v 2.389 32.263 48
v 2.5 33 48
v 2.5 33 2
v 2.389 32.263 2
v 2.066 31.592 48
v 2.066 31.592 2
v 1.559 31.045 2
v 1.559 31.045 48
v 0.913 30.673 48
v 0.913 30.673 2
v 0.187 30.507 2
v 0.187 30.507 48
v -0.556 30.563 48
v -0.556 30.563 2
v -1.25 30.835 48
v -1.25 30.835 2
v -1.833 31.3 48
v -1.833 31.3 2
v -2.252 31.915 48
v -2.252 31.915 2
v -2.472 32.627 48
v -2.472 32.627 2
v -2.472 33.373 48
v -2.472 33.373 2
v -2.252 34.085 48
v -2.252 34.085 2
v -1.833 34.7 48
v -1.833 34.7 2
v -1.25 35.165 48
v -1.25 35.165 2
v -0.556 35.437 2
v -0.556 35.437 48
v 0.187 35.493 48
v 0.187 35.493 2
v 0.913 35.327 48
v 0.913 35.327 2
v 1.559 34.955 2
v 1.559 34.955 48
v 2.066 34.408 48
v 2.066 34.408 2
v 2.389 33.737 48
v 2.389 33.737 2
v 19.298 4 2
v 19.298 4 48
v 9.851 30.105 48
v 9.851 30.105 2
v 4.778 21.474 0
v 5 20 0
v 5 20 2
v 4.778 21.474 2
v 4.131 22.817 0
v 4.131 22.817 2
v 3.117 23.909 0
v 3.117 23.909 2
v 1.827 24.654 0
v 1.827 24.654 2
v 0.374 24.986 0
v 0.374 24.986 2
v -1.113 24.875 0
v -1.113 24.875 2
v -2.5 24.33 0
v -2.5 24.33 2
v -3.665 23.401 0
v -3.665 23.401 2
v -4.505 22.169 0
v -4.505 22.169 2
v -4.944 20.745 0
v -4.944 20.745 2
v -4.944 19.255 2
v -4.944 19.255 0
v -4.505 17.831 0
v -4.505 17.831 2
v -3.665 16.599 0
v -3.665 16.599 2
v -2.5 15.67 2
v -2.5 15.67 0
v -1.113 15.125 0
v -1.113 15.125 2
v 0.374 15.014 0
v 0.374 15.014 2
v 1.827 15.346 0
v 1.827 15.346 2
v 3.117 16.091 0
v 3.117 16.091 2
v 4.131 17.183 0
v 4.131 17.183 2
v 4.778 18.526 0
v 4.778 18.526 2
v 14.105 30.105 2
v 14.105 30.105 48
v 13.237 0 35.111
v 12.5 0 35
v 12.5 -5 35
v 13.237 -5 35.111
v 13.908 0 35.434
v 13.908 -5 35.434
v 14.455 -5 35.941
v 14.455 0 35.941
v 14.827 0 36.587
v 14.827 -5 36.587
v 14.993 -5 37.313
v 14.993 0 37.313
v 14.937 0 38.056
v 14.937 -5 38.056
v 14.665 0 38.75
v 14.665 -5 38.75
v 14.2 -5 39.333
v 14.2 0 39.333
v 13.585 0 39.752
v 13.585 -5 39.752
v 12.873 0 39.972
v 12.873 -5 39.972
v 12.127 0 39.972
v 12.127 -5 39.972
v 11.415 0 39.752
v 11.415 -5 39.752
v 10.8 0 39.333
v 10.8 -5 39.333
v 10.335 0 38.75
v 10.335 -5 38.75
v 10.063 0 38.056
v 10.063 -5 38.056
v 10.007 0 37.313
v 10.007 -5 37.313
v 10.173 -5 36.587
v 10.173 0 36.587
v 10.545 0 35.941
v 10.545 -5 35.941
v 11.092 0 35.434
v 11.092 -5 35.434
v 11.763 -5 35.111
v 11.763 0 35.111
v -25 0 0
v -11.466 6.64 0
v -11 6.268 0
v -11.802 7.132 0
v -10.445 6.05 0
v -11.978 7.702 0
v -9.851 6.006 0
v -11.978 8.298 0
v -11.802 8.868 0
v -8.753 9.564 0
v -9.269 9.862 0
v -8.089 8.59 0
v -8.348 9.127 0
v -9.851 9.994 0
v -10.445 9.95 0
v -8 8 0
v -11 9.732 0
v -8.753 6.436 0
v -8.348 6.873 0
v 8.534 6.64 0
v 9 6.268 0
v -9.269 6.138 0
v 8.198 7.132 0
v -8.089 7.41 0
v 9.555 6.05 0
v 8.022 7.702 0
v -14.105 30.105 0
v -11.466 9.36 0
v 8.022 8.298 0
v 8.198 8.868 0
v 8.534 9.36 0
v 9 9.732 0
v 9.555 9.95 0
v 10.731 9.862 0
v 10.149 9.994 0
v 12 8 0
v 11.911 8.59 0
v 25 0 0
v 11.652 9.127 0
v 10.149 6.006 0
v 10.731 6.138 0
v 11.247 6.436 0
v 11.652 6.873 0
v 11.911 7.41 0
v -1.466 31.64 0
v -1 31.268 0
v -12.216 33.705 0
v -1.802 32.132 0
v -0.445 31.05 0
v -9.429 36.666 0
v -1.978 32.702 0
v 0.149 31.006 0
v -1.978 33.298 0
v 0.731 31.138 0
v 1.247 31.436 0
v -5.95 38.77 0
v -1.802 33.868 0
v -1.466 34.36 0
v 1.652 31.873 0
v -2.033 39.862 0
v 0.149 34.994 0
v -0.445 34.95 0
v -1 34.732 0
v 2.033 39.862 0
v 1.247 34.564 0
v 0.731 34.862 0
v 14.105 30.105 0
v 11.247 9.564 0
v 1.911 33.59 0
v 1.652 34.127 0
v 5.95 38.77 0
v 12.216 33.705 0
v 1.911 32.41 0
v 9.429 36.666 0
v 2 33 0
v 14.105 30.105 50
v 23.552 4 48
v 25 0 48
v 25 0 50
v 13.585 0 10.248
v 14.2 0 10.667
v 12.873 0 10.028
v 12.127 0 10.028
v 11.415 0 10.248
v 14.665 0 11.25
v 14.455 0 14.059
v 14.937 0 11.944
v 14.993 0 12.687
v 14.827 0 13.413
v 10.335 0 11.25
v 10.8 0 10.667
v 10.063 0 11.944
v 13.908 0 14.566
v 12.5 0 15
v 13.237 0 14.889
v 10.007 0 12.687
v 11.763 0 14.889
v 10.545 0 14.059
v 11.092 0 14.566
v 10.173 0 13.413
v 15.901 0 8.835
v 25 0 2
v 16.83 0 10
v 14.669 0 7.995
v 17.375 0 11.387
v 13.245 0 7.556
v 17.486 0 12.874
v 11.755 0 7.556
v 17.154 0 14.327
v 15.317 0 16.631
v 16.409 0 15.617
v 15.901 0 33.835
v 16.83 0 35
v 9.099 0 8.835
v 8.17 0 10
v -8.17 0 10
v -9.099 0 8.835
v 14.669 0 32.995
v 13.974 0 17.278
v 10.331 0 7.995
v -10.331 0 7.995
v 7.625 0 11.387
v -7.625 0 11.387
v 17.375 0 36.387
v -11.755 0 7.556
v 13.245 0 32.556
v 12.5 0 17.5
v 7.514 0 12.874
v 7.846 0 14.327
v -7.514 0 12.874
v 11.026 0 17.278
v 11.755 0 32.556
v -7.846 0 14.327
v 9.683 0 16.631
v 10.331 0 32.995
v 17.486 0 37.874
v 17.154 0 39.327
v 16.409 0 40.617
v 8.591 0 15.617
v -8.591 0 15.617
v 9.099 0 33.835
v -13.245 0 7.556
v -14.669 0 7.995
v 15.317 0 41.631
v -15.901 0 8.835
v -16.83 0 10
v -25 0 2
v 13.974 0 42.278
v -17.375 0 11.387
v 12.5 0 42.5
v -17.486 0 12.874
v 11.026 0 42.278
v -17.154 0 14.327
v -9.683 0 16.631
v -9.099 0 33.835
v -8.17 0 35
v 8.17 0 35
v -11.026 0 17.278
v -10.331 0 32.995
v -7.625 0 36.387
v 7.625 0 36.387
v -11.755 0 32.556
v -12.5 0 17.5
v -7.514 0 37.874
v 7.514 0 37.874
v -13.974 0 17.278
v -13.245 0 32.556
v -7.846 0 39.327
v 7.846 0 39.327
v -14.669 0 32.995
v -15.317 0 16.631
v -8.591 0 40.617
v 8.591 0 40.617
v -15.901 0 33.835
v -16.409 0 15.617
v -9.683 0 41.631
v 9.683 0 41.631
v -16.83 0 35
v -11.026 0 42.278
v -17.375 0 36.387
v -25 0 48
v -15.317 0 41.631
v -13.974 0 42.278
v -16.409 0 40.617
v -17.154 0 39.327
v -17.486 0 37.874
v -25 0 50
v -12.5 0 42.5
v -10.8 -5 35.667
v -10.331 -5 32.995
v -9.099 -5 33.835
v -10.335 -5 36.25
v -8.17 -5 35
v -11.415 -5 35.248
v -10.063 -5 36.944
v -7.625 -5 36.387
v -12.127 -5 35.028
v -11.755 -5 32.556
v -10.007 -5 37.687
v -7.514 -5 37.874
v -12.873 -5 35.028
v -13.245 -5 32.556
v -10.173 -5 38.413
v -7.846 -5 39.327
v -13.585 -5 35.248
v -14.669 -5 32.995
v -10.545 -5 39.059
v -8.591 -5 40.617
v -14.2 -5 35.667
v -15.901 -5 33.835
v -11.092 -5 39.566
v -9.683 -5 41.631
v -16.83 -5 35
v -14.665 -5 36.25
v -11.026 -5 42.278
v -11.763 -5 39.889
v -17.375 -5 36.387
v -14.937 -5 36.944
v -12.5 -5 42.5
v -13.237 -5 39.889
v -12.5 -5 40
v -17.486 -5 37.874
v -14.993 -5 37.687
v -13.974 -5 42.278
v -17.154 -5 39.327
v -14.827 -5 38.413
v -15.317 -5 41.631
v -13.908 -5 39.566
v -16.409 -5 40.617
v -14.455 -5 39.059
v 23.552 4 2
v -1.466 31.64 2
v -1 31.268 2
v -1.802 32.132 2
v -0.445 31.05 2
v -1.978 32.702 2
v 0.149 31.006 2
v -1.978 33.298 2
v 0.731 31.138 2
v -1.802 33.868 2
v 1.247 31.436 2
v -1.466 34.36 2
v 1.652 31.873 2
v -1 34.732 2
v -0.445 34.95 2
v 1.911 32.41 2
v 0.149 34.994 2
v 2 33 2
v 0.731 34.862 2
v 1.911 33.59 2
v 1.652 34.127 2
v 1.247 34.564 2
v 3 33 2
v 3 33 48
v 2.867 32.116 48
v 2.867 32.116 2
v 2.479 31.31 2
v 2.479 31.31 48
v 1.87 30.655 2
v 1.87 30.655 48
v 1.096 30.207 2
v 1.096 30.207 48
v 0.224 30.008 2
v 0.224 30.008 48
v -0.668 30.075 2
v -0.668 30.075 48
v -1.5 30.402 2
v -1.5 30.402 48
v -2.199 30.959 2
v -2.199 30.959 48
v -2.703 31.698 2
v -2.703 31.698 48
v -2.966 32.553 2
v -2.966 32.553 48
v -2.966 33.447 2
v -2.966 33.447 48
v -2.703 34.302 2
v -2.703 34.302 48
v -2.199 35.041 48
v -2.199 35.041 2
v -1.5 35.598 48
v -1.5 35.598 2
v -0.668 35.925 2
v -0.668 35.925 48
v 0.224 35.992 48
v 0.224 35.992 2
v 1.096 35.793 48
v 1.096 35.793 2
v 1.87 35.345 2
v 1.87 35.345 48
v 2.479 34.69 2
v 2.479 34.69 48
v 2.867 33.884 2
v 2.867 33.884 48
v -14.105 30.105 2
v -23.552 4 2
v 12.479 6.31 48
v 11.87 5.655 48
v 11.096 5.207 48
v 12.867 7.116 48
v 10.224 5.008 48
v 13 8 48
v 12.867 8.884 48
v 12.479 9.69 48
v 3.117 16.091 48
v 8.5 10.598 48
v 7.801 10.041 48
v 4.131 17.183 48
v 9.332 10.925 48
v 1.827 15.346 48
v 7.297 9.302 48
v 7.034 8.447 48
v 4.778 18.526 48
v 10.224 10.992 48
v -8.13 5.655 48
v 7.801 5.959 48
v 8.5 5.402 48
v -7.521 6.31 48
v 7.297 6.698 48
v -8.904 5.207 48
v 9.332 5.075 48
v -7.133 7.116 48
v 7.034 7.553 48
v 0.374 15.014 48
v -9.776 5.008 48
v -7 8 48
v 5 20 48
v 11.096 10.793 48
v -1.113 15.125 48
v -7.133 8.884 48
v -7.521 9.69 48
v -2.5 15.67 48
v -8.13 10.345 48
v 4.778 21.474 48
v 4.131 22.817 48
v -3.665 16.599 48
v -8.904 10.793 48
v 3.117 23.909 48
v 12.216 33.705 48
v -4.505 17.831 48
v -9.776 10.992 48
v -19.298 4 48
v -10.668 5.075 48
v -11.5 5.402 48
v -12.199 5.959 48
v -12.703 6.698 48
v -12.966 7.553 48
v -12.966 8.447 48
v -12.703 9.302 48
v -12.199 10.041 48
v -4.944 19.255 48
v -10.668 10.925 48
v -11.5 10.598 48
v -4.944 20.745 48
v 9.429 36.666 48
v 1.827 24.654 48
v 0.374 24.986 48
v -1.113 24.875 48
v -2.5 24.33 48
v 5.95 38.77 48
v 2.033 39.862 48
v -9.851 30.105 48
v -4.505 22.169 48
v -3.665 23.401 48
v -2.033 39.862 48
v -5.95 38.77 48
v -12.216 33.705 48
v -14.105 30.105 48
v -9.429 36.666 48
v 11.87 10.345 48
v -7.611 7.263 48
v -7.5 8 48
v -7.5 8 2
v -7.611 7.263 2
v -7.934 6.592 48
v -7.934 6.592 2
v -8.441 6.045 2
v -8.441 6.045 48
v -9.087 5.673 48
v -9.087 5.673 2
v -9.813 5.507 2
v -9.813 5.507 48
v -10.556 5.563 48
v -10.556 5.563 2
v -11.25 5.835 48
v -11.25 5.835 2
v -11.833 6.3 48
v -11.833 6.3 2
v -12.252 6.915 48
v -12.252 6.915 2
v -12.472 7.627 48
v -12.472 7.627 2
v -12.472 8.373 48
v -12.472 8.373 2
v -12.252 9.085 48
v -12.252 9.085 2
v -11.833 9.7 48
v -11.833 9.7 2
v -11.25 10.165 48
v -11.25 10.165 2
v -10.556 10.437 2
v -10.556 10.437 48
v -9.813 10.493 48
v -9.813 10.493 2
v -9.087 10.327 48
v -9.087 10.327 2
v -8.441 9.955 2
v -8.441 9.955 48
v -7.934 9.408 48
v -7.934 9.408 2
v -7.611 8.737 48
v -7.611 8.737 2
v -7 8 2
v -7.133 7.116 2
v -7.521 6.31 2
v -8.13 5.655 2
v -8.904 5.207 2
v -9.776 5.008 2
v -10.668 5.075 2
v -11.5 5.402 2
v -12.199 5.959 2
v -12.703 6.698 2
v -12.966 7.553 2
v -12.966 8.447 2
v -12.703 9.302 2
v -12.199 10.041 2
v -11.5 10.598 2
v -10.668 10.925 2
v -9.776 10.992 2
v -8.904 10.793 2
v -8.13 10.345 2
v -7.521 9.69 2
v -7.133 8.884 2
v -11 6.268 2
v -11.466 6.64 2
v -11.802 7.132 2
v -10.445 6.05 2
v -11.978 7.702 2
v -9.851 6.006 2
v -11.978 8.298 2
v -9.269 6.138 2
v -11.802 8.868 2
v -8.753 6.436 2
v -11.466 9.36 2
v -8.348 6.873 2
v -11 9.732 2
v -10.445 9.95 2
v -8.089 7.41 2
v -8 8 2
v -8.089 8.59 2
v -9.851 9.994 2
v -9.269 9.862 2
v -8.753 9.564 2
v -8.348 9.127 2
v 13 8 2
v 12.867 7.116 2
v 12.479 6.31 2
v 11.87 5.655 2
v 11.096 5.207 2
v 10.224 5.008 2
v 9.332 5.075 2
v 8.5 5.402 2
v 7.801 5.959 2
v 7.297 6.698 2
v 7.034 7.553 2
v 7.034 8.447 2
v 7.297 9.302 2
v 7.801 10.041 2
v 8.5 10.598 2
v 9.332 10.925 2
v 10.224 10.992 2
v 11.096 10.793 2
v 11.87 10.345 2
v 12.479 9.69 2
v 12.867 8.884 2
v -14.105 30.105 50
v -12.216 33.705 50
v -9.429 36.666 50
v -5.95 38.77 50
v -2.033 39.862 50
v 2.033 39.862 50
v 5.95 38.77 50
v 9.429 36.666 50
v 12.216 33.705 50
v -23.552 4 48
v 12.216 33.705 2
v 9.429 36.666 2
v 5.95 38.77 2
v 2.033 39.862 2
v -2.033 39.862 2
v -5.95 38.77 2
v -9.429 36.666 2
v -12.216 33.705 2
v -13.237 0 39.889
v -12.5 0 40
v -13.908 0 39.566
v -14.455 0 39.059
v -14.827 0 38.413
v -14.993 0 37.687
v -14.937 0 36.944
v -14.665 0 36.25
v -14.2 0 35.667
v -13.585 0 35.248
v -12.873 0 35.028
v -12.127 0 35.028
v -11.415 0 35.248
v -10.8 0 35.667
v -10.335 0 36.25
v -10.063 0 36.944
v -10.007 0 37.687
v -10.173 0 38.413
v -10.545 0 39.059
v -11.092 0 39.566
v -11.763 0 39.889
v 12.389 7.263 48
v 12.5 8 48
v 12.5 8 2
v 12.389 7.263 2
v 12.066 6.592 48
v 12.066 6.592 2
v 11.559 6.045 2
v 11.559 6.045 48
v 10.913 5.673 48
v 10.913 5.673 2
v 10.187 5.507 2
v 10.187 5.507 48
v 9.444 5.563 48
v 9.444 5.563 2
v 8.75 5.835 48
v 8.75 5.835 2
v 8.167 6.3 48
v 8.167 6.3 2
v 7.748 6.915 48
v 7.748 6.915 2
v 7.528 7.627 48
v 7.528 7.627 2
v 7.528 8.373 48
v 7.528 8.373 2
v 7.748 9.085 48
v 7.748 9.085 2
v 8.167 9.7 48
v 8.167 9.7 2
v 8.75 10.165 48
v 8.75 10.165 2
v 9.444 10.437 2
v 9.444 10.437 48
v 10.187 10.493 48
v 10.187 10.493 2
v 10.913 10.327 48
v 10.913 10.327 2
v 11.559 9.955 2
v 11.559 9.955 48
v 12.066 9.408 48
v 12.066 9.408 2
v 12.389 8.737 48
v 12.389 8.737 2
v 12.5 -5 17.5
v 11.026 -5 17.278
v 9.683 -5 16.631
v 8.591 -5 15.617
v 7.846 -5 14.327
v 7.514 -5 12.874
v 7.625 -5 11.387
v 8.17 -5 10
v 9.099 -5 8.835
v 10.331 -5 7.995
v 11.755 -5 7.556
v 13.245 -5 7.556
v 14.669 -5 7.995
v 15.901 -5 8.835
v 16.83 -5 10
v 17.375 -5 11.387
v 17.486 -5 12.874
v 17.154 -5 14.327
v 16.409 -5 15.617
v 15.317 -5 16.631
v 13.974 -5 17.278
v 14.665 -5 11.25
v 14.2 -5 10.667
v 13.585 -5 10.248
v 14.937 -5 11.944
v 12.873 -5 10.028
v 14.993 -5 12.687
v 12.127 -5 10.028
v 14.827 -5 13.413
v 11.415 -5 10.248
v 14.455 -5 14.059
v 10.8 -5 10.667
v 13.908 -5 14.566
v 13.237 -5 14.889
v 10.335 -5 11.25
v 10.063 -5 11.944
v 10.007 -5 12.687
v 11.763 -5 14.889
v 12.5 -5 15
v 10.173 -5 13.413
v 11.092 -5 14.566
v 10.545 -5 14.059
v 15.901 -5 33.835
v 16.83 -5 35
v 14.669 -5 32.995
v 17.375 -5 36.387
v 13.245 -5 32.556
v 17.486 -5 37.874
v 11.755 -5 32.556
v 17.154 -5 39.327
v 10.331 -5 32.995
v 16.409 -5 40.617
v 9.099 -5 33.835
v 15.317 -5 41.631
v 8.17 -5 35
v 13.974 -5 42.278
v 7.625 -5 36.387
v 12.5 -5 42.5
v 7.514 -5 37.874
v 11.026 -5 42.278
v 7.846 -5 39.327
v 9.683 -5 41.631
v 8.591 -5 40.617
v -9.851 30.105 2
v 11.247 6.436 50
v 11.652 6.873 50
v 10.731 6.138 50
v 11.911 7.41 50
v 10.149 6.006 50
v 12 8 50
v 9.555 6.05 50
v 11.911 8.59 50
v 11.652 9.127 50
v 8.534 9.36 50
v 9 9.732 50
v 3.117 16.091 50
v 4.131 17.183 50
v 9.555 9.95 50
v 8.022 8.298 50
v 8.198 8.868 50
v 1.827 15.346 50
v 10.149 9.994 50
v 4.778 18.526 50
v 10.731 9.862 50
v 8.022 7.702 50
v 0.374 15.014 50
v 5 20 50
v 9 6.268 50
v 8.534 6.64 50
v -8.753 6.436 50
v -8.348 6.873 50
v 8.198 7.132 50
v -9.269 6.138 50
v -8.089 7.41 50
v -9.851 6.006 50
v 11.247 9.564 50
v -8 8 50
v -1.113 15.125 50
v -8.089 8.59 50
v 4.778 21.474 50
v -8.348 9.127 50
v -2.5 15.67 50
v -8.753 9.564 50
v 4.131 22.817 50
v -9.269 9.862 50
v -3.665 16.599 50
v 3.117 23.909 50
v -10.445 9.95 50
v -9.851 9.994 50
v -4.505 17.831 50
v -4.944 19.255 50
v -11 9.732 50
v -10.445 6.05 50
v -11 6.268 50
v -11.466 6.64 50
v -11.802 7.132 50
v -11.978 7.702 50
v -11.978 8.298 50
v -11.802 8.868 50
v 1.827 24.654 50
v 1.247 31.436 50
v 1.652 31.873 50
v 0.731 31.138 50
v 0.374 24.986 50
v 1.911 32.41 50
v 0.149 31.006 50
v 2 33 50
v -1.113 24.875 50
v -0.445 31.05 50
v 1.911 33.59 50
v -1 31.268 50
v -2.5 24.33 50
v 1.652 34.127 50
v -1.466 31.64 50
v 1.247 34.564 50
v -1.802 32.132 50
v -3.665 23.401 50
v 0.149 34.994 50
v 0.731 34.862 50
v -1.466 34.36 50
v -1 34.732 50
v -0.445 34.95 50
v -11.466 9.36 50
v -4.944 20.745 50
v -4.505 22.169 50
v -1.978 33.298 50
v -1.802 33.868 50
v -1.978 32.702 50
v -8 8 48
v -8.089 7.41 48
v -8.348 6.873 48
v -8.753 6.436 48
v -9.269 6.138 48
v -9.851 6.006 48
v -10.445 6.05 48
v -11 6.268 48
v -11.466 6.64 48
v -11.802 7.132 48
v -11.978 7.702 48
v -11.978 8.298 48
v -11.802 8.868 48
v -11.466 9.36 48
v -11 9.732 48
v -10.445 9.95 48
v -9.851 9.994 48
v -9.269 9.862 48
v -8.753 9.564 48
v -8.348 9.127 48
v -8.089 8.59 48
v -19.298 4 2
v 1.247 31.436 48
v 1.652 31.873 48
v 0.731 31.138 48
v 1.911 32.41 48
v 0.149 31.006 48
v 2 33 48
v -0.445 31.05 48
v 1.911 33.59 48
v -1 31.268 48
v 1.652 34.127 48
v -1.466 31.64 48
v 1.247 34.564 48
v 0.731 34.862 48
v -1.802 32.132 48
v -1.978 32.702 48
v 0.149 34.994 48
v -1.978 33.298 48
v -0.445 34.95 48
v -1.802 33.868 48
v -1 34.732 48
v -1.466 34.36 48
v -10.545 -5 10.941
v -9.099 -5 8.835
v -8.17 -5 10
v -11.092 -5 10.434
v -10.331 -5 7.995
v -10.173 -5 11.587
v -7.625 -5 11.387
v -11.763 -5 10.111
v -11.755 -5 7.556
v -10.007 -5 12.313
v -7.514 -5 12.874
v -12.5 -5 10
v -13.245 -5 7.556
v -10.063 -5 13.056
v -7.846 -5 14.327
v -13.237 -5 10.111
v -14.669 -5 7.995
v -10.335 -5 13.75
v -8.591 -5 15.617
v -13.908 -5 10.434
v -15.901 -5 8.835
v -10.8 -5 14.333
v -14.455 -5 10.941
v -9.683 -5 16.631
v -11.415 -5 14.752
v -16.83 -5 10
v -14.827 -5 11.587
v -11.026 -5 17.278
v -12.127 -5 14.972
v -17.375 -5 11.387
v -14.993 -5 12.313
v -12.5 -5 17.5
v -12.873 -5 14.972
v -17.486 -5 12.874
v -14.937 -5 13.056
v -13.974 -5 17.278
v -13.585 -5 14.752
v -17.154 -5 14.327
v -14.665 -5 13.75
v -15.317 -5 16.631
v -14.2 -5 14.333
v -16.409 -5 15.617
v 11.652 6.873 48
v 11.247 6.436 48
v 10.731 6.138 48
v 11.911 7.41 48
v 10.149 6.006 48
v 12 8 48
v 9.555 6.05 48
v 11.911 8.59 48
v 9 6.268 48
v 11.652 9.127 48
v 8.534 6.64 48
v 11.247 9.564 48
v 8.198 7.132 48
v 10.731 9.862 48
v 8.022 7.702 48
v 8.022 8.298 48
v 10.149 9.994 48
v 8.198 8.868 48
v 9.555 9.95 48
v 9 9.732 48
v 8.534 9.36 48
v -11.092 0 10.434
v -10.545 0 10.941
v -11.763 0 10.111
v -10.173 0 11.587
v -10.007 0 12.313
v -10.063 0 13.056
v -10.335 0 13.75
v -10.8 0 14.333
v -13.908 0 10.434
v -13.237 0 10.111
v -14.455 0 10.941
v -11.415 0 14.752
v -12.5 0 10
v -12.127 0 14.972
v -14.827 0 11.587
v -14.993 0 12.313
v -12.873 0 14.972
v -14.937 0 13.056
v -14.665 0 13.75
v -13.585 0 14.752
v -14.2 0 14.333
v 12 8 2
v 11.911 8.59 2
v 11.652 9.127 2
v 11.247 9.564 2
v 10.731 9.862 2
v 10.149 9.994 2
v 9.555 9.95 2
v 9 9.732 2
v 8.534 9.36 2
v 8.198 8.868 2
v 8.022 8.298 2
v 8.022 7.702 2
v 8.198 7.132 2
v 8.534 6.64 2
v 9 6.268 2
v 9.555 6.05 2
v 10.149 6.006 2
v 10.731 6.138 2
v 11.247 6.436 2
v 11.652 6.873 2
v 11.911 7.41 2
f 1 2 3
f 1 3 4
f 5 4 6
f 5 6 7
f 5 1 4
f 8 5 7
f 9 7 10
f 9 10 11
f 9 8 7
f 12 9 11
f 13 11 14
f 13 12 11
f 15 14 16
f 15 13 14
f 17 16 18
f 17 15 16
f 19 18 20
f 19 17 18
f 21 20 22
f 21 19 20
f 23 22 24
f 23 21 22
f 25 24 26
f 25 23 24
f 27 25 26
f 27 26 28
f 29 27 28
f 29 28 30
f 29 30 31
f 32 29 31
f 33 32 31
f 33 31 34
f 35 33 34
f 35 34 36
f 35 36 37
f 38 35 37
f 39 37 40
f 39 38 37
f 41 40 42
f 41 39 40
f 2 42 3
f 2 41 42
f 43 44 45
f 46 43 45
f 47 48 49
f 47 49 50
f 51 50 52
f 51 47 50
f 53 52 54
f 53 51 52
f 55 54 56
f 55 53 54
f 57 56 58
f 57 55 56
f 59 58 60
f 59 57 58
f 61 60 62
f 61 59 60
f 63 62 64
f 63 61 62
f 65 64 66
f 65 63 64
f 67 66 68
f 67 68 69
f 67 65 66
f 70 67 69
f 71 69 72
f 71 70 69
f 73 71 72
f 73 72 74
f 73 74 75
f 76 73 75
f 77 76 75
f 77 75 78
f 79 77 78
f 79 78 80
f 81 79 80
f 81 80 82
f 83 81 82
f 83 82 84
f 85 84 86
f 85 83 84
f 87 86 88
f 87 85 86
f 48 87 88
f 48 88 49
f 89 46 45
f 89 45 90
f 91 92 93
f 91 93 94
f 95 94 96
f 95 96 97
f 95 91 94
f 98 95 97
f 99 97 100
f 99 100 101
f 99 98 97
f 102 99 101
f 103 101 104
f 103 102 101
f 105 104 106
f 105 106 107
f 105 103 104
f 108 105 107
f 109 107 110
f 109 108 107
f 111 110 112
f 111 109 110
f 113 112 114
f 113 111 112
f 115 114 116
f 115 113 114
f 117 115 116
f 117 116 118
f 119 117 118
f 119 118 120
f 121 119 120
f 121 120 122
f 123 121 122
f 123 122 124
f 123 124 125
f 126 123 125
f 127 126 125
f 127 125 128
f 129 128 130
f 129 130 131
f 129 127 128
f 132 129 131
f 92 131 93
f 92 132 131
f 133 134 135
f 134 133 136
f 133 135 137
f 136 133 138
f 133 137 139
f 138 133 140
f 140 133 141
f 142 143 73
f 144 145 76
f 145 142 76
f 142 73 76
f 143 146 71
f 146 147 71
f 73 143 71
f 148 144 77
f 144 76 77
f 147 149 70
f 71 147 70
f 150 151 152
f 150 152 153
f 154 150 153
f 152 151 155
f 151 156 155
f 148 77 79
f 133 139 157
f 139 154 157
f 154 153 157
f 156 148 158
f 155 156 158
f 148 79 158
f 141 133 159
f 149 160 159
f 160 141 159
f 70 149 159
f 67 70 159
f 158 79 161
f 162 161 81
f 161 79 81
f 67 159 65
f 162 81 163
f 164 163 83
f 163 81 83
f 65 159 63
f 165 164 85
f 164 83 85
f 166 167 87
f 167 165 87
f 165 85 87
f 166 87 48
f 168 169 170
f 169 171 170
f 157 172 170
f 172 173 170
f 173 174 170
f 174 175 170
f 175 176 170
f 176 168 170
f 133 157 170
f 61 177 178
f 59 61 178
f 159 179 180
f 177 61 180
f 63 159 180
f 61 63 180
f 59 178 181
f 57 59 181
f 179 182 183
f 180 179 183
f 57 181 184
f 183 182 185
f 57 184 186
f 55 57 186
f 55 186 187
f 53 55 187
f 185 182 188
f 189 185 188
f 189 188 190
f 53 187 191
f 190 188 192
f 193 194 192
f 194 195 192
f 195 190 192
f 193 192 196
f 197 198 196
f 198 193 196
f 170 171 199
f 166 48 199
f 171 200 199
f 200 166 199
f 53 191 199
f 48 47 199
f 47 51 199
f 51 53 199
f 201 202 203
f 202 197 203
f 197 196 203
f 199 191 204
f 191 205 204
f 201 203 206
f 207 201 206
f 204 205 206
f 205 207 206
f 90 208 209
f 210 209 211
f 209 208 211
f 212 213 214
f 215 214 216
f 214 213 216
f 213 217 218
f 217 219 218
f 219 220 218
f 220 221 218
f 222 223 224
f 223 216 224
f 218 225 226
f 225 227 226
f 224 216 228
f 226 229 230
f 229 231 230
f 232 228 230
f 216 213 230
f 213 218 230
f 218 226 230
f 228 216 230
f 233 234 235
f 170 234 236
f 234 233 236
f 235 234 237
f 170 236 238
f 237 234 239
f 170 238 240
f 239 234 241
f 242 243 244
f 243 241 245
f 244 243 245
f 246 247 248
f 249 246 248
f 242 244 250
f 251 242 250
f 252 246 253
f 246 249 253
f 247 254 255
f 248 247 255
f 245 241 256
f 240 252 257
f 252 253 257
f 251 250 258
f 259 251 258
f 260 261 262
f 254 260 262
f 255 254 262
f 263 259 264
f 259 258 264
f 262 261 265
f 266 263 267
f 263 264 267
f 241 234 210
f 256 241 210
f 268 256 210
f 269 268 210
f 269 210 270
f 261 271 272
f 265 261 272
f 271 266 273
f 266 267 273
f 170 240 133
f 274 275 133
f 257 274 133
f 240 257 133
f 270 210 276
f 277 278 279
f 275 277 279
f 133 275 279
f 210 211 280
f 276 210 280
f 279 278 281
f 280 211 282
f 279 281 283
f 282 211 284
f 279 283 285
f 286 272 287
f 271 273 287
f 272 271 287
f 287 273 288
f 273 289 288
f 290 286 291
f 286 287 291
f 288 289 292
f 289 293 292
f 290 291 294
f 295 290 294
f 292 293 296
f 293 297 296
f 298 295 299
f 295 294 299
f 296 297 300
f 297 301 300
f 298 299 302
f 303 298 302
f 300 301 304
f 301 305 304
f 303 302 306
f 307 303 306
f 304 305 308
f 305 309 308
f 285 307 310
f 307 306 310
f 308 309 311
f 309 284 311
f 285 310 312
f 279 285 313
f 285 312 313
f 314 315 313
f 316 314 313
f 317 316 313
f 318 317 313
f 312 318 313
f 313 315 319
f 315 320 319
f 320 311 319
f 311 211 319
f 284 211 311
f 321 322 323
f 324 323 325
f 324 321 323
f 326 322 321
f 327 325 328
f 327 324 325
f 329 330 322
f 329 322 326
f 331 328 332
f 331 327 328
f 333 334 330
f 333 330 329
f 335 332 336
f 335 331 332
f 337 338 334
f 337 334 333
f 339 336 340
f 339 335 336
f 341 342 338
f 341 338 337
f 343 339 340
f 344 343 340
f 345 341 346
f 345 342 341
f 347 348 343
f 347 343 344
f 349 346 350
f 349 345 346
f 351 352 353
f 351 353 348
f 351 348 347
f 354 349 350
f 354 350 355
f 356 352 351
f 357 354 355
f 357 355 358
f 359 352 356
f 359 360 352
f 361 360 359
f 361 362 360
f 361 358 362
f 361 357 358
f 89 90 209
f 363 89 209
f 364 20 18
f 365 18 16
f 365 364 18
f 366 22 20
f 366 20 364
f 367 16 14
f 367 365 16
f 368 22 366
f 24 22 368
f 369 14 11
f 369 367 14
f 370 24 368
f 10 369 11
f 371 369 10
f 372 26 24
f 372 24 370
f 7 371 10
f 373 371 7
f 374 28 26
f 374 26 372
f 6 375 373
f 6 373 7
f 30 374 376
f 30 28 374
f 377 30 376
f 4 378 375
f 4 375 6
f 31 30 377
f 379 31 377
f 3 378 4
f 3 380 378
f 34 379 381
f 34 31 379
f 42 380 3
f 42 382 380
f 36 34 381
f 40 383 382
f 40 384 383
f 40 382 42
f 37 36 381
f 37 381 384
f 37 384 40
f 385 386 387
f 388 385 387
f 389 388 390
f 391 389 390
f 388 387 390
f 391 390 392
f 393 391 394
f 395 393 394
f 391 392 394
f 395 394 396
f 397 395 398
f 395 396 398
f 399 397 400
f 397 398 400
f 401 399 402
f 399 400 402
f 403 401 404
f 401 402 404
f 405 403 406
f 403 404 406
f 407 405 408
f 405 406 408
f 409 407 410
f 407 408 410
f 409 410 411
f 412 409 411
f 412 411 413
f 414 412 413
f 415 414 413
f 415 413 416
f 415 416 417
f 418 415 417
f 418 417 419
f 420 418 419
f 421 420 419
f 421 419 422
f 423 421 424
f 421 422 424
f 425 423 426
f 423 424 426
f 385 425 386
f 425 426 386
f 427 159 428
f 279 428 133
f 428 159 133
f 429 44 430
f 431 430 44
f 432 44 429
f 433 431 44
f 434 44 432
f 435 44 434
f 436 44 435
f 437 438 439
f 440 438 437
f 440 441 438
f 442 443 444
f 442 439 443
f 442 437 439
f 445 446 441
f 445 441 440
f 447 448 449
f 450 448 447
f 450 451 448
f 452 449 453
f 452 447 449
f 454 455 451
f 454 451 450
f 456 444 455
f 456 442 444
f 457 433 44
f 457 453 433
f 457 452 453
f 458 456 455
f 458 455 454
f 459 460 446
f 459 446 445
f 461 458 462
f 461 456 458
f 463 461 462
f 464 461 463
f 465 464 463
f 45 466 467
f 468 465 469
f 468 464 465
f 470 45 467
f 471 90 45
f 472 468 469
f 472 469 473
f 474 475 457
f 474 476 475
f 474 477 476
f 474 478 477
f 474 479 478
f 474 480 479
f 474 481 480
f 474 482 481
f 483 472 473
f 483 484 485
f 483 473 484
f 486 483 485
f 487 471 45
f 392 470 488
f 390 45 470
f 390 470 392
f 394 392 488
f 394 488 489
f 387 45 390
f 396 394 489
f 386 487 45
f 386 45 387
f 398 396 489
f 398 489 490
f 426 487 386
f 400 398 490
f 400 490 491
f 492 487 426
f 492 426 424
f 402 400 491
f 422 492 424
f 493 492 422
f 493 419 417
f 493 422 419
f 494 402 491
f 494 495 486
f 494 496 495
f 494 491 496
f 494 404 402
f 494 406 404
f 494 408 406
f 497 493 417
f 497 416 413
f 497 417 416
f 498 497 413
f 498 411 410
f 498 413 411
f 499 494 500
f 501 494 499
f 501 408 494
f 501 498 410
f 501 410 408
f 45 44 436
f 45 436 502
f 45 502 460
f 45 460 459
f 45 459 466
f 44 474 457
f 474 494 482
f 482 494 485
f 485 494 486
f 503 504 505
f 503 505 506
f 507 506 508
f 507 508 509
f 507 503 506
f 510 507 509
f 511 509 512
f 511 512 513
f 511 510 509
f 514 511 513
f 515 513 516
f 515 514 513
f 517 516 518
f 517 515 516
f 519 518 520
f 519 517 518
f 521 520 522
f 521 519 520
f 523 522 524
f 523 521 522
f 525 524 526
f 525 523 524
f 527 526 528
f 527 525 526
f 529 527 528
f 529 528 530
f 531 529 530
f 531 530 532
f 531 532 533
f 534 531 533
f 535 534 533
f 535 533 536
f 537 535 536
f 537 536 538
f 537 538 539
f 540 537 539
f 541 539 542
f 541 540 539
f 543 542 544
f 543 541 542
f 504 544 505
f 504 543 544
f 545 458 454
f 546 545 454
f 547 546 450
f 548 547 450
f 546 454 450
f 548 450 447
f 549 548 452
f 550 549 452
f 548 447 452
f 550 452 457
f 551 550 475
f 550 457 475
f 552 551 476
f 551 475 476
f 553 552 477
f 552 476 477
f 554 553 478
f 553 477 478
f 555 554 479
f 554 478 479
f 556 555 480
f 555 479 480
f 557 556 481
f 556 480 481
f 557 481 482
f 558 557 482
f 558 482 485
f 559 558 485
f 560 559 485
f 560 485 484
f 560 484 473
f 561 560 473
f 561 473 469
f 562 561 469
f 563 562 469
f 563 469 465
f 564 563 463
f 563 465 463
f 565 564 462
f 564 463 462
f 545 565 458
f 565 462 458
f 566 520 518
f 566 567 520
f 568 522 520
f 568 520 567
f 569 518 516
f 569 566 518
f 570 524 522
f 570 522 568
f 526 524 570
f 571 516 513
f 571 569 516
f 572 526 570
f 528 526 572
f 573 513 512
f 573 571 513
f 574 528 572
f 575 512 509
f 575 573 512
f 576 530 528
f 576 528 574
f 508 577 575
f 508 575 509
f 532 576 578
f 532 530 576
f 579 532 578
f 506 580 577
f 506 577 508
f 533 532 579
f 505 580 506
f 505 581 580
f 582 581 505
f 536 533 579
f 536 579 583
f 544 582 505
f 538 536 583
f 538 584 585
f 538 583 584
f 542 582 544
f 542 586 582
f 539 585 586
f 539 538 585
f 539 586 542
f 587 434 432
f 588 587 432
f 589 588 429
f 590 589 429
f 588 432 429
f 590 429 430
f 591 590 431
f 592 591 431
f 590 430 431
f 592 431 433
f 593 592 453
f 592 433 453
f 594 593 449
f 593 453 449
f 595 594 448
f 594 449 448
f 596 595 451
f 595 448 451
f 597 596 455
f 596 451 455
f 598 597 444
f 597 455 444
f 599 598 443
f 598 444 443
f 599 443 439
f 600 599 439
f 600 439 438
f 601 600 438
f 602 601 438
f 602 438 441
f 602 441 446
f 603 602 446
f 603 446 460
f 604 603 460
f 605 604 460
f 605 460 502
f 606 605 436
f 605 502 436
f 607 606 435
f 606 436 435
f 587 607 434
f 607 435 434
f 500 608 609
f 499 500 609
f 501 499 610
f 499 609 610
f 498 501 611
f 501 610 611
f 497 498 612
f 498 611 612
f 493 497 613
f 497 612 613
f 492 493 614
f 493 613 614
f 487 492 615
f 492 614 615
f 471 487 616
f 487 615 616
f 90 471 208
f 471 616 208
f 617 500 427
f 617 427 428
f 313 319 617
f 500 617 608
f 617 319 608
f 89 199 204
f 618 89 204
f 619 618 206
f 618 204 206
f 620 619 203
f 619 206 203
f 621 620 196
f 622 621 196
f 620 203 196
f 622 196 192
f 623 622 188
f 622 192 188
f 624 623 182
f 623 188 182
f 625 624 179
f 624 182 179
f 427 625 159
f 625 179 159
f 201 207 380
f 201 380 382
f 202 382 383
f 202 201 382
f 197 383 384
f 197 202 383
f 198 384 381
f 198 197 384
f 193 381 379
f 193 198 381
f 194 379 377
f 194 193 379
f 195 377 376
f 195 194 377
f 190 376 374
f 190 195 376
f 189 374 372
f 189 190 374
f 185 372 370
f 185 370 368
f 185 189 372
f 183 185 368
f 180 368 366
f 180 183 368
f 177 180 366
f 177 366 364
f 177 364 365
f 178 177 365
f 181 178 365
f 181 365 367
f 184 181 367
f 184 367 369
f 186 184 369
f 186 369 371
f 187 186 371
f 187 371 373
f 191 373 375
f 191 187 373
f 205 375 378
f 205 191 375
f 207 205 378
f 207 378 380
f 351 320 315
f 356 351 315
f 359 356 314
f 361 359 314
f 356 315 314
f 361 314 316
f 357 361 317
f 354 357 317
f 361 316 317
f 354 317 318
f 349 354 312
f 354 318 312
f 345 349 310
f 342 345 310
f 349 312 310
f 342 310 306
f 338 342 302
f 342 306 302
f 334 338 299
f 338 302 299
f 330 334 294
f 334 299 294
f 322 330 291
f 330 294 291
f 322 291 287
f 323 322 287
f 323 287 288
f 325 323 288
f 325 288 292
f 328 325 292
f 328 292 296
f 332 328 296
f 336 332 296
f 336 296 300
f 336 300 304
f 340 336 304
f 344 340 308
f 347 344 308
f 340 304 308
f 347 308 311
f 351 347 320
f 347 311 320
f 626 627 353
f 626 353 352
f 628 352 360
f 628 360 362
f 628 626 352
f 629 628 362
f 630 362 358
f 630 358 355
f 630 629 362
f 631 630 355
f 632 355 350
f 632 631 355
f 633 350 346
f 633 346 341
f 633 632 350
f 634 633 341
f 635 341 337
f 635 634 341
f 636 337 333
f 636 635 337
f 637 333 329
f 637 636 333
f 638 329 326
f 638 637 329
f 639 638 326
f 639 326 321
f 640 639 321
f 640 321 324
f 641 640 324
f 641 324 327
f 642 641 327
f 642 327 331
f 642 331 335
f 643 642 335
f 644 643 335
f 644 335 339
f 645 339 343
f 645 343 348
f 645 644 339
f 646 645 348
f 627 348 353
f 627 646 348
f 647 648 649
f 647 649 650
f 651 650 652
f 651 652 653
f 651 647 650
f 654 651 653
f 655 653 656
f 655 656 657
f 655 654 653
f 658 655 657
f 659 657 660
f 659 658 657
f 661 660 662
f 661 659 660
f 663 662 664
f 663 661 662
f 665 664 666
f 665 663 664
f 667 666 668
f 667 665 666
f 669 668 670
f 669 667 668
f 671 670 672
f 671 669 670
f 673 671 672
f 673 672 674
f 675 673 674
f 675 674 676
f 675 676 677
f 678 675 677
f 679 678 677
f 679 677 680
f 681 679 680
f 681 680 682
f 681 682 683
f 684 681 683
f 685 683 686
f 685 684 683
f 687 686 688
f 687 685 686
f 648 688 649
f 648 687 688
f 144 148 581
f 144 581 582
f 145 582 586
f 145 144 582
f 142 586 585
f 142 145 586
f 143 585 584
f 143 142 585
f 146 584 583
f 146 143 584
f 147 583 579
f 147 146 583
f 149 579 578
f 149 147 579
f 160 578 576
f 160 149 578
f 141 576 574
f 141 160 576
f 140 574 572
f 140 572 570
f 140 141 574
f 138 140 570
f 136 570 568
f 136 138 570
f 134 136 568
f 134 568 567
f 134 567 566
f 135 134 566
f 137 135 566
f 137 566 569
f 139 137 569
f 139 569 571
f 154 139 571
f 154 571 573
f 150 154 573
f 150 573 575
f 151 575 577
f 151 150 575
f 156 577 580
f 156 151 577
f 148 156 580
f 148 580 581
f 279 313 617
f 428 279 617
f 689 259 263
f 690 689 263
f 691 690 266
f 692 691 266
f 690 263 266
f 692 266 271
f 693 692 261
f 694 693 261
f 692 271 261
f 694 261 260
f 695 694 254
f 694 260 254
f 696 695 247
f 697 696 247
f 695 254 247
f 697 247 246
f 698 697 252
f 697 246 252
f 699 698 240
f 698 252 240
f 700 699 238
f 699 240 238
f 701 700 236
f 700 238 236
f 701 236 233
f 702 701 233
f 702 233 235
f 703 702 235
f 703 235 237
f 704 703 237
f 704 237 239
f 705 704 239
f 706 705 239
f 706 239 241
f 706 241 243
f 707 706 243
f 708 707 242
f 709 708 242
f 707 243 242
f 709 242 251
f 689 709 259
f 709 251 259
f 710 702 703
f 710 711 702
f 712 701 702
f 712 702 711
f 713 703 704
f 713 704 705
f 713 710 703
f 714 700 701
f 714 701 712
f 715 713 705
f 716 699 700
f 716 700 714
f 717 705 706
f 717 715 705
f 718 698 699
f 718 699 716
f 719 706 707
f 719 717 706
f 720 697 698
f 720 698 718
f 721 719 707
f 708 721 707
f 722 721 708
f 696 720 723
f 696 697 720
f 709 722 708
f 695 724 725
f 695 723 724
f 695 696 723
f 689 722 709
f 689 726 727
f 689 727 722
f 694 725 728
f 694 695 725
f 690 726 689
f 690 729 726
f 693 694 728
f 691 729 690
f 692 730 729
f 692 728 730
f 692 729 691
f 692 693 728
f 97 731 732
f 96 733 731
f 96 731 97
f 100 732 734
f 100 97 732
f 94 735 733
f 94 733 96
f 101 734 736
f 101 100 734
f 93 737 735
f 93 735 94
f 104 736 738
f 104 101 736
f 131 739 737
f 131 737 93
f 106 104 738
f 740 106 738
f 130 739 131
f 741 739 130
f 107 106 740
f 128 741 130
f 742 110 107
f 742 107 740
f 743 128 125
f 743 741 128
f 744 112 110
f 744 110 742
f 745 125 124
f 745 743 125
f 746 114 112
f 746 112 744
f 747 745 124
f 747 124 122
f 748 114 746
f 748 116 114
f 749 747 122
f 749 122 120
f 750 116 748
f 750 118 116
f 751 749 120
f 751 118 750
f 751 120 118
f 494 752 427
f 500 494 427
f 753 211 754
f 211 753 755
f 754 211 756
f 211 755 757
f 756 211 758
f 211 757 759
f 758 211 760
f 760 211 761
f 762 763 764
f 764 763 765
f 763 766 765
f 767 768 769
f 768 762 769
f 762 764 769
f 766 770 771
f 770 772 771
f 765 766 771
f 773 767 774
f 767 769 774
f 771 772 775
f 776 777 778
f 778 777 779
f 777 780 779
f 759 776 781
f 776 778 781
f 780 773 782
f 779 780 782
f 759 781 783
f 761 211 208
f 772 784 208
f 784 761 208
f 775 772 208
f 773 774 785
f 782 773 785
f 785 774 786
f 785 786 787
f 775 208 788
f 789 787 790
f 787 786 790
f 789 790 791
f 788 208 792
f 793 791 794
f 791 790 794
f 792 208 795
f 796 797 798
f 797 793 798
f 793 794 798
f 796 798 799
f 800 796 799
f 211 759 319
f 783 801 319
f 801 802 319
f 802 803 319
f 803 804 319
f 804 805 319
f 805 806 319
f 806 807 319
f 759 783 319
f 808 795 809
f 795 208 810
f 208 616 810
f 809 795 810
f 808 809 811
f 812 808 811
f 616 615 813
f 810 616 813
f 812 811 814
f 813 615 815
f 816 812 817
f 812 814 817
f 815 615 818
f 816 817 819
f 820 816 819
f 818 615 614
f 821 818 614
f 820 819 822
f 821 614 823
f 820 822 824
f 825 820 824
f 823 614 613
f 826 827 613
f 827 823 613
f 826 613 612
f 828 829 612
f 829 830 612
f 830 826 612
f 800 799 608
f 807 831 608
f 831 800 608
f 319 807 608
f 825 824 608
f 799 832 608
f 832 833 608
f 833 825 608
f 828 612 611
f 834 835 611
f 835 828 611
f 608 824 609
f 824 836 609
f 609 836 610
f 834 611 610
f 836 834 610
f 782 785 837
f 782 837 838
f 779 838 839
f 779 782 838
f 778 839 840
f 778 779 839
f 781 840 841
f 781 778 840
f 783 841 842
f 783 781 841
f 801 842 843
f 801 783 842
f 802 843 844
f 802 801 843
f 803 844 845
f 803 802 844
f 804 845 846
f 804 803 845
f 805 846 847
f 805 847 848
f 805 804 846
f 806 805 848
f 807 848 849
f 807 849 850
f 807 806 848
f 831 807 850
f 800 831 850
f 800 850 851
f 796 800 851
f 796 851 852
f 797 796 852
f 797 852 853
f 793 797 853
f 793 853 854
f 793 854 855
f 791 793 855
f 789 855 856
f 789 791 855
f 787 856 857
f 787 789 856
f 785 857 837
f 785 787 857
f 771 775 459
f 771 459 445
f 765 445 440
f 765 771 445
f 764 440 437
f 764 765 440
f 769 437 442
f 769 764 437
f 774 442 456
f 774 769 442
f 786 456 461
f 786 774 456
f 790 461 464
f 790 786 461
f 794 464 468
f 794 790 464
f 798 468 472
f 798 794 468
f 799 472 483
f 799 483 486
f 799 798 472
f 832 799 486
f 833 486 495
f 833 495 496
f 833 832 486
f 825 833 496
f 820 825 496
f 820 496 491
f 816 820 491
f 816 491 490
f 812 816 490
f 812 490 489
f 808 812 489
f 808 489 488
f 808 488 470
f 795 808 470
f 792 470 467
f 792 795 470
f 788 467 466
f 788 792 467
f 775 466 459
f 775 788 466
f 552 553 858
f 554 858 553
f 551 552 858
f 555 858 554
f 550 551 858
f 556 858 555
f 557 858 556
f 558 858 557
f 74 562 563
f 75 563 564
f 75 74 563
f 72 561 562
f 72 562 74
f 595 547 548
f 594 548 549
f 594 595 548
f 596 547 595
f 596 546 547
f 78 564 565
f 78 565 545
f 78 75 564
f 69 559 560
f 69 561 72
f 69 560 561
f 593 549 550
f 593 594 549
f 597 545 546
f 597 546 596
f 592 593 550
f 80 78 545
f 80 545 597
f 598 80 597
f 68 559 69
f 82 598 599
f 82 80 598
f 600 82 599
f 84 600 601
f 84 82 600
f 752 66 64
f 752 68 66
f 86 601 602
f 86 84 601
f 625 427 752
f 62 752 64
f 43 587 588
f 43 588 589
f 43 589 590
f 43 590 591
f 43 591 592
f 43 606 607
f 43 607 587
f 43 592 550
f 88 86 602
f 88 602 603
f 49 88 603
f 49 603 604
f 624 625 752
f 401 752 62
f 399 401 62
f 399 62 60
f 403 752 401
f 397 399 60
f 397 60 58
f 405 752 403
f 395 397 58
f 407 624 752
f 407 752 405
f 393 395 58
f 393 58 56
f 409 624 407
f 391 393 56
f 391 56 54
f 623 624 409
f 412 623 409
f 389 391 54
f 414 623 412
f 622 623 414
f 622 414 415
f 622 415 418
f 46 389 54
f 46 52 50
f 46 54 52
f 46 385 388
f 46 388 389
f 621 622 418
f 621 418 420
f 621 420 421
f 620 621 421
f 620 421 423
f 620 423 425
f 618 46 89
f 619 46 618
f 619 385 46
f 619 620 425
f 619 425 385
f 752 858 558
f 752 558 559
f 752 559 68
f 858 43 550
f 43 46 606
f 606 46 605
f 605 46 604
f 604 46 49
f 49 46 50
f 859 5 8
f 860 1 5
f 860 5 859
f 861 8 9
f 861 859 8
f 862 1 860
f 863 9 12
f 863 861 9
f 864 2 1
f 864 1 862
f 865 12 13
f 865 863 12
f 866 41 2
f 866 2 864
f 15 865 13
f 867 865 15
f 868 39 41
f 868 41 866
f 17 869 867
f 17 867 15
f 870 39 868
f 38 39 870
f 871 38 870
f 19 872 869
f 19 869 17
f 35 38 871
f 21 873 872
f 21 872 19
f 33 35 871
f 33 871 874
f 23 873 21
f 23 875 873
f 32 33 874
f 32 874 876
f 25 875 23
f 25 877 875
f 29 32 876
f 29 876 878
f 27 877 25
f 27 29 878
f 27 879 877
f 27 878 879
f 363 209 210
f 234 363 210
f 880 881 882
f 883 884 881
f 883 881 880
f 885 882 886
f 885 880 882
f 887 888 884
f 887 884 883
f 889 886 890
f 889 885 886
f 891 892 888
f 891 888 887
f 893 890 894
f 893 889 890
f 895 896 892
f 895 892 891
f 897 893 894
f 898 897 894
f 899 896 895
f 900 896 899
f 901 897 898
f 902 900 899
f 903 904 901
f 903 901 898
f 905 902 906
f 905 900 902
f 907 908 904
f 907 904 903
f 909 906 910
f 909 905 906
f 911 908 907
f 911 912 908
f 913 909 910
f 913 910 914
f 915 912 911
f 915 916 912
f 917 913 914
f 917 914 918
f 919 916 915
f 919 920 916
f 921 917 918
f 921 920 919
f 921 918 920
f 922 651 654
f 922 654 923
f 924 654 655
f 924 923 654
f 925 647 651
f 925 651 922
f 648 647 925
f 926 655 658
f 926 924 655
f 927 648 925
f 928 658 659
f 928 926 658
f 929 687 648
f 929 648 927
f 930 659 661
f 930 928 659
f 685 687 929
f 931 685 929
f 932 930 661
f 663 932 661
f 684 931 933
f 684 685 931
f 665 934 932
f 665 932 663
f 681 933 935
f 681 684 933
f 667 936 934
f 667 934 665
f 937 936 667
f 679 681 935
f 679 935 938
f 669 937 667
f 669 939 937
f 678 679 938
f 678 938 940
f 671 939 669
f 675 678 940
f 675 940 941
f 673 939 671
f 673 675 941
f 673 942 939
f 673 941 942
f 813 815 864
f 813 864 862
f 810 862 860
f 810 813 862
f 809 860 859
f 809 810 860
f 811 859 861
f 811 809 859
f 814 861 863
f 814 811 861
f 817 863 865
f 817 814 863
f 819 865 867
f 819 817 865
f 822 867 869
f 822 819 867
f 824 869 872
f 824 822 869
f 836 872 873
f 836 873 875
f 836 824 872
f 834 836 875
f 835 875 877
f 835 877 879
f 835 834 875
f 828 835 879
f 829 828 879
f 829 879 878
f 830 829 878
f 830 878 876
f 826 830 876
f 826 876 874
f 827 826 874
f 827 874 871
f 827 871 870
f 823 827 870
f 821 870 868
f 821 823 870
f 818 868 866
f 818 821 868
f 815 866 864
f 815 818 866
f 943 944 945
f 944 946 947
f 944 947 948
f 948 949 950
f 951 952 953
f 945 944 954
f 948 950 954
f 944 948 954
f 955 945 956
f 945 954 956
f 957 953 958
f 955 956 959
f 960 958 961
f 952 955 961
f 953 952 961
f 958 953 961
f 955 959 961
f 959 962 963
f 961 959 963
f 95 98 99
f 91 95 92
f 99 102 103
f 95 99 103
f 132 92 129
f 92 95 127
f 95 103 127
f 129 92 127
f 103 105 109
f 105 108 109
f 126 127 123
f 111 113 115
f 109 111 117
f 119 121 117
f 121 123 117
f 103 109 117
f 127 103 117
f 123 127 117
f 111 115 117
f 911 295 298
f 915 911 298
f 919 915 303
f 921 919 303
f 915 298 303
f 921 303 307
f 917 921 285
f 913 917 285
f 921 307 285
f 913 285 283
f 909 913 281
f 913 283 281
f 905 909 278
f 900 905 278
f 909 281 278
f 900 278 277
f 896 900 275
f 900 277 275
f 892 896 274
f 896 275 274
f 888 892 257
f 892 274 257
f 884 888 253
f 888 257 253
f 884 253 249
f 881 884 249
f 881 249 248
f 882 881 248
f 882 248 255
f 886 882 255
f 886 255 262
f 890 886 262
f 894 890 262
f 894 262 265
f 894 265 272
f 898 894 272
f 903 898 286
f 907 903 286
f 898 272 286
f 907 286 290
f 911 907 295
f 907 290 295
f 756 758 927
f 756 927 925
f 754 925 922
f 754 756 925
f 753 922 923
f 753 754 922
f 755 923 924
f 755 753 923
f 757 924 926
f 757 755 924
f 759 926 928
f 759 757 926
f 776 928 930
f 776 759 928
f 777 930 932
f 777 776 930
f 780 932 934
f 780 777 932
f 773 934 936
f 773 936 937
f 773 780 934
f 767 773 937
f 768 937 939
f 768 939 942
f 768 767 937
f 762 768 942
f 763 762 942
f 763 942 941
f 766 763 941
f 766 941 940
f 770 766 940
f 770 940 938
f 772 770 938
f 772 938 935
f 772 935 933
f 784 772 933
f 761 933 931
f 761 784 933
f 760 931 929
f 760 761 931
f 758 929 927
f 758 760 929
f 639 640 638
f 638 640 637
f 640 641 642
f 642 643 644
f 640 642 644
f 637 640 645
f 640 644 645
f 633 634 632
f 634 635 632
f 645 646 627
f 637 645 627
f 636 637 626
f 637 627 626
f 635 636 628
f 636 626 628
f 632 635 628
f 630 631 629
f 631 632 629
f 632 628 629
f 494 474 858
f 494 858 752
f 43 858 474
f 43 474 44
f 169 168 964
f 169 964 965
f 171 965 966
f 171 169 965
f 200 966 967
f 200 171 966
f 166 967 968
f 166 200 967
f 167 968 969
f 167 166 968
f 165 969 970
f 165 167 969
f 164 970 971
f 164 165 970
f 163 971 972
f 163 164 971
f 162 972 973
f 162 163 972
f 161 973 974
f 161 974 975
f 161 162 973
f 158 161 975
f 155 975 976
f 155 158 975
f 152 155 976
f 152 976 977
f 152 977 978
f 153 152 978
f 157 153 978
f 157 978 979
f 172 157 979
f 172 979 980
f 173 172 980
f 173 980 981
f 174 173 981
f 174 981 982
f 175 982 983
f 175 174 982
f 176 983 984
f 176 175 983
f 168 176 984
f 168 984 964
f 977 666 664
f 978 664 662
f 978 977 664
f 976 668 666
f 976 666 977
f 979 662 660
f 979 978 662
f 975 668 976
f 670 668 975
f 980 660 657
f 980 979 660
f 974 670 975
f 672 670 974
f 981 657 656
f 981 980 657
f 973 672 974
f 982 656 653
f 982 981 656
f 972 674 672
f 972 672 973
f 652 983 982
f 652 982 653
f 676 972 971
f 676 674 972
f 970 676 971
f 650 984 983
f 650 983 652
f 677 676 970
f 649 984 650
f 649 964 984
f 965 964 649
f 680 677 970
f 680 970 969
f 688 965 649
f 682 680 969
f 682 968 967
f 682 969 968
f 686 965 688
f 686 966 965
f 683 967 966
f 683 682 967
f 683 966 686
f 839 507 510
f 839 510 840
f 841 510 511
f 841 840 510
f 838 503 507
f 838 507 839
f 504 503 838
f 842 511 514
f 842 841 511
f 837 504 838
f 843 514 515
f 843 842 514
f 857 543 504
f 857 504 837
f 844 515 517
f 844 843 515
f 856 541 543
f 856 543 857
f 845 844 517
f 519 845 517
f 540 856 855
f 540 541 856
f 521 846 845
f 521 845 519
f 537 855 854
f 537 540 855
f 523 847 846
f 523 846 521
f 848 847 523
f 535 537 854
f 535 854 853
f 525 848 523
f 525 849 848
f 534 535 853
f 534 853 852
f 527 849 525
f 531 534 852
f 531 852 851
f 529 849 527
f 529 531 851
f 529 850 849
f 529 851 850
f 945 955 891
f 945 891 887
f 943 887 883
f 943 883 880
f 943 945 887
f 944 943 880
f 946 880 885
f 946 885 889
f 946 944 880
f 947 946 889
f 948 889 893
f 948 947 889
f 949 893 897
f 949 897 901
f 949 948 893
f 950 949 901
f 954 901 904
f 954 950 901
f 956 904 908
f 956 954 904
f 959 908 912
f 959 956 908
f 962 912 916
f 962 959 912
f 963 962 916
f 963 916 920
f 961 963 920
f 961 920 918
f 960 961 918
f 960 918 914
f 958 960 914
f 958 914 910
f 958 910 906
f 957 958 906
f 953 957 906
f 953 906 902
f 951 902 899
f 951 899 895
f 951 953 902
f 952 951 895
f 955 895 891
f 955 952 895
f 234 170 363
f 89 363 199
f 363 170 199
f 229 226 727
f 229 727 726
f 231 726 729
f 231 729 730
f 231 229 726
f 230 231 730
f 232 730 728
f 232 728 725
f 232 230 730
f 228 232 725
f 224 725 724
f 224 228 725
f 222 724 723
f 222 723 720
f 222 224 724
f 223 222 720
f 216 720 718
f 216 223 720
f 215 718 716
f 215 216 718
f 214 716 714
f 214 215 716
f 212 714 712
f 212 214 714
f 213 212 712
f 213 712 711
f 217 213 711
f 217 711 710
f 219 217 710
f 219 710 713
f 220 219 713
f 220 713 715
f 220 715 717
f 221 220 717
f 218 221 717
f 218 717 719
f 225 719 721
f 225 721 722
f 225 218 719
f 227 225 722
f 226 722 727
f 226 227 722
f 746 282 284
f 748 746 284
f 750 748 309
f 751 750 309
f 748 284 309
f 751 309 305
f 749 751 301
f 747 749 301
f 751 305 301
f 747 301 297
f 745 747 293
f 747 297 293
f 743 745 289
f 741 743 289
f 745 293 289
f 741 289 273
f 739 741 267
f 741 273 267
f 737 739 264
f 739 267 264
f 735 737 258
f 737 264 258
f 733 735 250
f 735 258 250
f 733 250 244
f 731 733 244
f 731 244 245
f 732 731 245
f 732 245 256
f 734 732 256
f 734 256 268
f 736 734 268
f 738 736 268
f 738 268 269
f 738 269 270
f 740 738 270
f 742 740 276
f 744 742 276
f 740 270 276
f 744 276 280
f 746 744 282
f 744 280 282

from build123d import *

# Parameters (mm, degrees)
SKETCH1_R           = 5
SKETCH1_R_2         = 2
BOSS_EXTRUDE1_DEPTH = 2
SKETCH2_R           = 2
SKETCH2_R_2         = 5
BOSS_EXTRUDE2_DEPTH = 2
BOSS_EXTRUDE3_DEPTH = 46
SKETCH7_R           = 3
SKETCH7_R_2         = 2.5
BOSS_EXTRUDE4_DEPTH = 46
BOSS_EXTRUDE5_DEPTH = 46
SKETCH10_R          = 5
SKETCH10_R_2        = 2.5
BOSS_EXTRUDE6_DEPTH = 5


with BuildPart() as part:
    # Sketch1 → Boss-Extrude1 (new body)
    with BuildSketch(Plane.XY):
        with BuildLine():
            Line((-25, 0), (25, 0))
            Line((25, 0), (14.104686356, 30.104686356))
            ThreePointArc((14.104686356, 30.104686356), (0, 40), (-14.104686356, 30.104686356))
            Line((-14.104686356, 30.104686356), (-25, 0))
        make_face()
        with Locations((0, 20)):
            Circle(SKETCH1_R, mode=Mode.SUBTRACT)
        with Locations((-10, 8)):
            Circle(SKETCH1_R_2, mode=Mode.SUBTRACT)
        with Locations((10, 8)):
            Circle(SKETCH1_R_2, mode=Mode.SUBTRACT)
        with Locations((0, 33)):
            Circle(SKETCH1_R_2, mode=Mode.SUBTRACT)
    extrude(amount=BOSS_EXTRUDE1_DEPTH)



with BuildPart() as body_2:
    # Sketch2 → Boss-Extrude2 (new body)
    with BuildSketch(Plane(origin=(0, 0, 50), x_dir=(-1, 0, 0), z_dir=(0, 0, -1))):
        with BuildLine():
            Line((-25, 0), (25, 0))
            Line((25, 0), (14.104686356, 30.104686356))
            ThreePointArc((14.104686356, 30.104686356), (0, 40), (-14.104686356, 30.104686356))
            Line((-14.104686356, 30.104686356), (-25, 0))
        make_face()
        with Locations(Location((-10, 8, 0), (0, 0, 180))):
            Circle(SKETCH2_R, mode=Mode.SUBTRACT)
        with Locations(Location((10, 8, 0), (0, 0, 180))):
            Circle(SKETCH2_R, mode=Mode.SUBTRACT)
        with Locations(Location((0, 33, 0), (0, 0, 180))):
            Circle(SKETCH2_R, mode=Mode.SUBTRACT)
        with Locations(Location((0, 20, 0), (0, 0, 180))):
            Circle(SKETCH2_R_2, mode=Mode.SUBTRACT)
    extrude(amount=BOSS_EXTRUDE2_DEPTH)


with BuildPart() as part_1:
    add(part.part)

    add(body_2.part)  # Boss-Extrude3 merges body 2
    # Sketch4 → Boss-Extrude3 (add)
    with BuildSketch(Plane(origin=(0, 0, 48), x_dir=(-1, 0, 0), z_dir=(0, 0, -1))):
        Polygon((-25, 0), (25, 0), (23.552343178, 4), (-23.552343178, 4), align=None)
    extrude(amount=BOSS_EXTRUDE3_DEPTH)

    # Sketch7 → Boss-Extrude4 (add)
    # profile 1 of 3: a face of its own
    with BuildSketch(Plane(origin=(0, 0, 48), x_dir=(-1, 0, 0), z_dir=(0, 0, -1))):
        with Locations(Location((10, 8, 0), (0, 0, 180))):
            Circle(SKETCH7_R)
        with Locations(Location((10, 8, 0), (0, 0, 180))):
            Circle(SKETCH7_R_2, mode=Mode.SUBTRACT)
    # profile 2 of 3: a face of its own
    with BuildSketch(Plane(origin=(0, 0, 48), x_dir=(-1, 0, 0), z_dir=(0, 0, -1))):
        with Locations(Location((0, 33, 0), (0, 0, 180))):
            Circle(SKETCH7_R)
        with Locations(Location((0, 33, 0), (0, 0, 180))):
            Circle(SKETCH7_R_2, mode=Mode.SUBTRACT)
    # profile 3 of 3: a face of its own
    with BuildSketch(Plane(origin=(0, 0, 48), x_dir=(-1, 0, 0), z_dir=(0, 0, -1))):
        with Locations(Location((-10, 8, 0), (0, 0, 180))):
            Circle(SKETCH7_R)
        with Locations(Location((-10, 8, 0), (0, 0, 180))):
            Circle(SKETCH7_R_2, mode=Mode.SUBTRACT)
    extrude(amount=BOSS_EXTRUDE4_DEPTH)

    # Sketch5 → Boss-Extrude5 (add)
    with BuildSketch(Plane(origin=(0, 0, 48), x_dir=(-1, 0, 0), z_dir=(0, 0, -1))):
        Polygon((19.298437881, 4), (9.850781059, 30.104686356), (14.104686356, 30.104686356), (23.552343178, 4), align=None)
        Polygon((-23.552343178, 4), (-19.298437881, 4), (-9.850781059, 30.104686356), (-14.104686356, 30.104686356), align=None)
    extrude(amount=BOSS_EXTRUDE5_DEPTH)

    # Sketch10 → Boss-Extrude6 (add)
    # profile 1 of 4: a face of its own
    with BuildSketch(Plane.XZ):
        with Locations(Location((-12.5, 12.5, 0), (0, 0, 90))):
            Circle(SKETCH10_R)
        with Locations(Location((-12.5, 12.5, 0), (0, 0, 270))):
            Circle(SKETCH10_R_2, mode=Mode.SUBTRACT)
    # profile 2 of 4: a face of its own
    with BuildSketch(Plane.XZ):
        with Locations(Location((-12.5, 37.5, 0), (0, 0, 90))):
            Circle(SKETCH10_R)
        with Locations(Location((-12.5, 37.5, 0), (0, 0, 90))):
            Circle(SKETCH10_R_2, mode=Mode.SUBTRACT)
    # profile 3 of 4: a face of its own
    with BuildSketch(Plane.XZ):
        with Locations(Location((12.5, 37.5, 0), (0, 0, 90))):
            Circle(SKETCH10_R)
        with Locations(Location((12.5, 37.5, 0), (0, 0, 270))):
            Circle(SKETCH10_R_2, mode=Mode.SUBTRACT)
    # profile 4 of 4: a face of its own
    with BuildSketch(Plane.XZ):
        with Locations(Location((12.5, 12.5, 0), (0, 0, 90))):
            Circle(SKETCH10_R)
        with Locations(Location((12.5, 12.5, 0), (0, 0, 90))):
            Circle(SKETCH10_R_2, mode=Mode.SUBTRACT)
    extrude(amount=BOSS_EXTRUDE6_DEPTH)


solid = part_1.part
